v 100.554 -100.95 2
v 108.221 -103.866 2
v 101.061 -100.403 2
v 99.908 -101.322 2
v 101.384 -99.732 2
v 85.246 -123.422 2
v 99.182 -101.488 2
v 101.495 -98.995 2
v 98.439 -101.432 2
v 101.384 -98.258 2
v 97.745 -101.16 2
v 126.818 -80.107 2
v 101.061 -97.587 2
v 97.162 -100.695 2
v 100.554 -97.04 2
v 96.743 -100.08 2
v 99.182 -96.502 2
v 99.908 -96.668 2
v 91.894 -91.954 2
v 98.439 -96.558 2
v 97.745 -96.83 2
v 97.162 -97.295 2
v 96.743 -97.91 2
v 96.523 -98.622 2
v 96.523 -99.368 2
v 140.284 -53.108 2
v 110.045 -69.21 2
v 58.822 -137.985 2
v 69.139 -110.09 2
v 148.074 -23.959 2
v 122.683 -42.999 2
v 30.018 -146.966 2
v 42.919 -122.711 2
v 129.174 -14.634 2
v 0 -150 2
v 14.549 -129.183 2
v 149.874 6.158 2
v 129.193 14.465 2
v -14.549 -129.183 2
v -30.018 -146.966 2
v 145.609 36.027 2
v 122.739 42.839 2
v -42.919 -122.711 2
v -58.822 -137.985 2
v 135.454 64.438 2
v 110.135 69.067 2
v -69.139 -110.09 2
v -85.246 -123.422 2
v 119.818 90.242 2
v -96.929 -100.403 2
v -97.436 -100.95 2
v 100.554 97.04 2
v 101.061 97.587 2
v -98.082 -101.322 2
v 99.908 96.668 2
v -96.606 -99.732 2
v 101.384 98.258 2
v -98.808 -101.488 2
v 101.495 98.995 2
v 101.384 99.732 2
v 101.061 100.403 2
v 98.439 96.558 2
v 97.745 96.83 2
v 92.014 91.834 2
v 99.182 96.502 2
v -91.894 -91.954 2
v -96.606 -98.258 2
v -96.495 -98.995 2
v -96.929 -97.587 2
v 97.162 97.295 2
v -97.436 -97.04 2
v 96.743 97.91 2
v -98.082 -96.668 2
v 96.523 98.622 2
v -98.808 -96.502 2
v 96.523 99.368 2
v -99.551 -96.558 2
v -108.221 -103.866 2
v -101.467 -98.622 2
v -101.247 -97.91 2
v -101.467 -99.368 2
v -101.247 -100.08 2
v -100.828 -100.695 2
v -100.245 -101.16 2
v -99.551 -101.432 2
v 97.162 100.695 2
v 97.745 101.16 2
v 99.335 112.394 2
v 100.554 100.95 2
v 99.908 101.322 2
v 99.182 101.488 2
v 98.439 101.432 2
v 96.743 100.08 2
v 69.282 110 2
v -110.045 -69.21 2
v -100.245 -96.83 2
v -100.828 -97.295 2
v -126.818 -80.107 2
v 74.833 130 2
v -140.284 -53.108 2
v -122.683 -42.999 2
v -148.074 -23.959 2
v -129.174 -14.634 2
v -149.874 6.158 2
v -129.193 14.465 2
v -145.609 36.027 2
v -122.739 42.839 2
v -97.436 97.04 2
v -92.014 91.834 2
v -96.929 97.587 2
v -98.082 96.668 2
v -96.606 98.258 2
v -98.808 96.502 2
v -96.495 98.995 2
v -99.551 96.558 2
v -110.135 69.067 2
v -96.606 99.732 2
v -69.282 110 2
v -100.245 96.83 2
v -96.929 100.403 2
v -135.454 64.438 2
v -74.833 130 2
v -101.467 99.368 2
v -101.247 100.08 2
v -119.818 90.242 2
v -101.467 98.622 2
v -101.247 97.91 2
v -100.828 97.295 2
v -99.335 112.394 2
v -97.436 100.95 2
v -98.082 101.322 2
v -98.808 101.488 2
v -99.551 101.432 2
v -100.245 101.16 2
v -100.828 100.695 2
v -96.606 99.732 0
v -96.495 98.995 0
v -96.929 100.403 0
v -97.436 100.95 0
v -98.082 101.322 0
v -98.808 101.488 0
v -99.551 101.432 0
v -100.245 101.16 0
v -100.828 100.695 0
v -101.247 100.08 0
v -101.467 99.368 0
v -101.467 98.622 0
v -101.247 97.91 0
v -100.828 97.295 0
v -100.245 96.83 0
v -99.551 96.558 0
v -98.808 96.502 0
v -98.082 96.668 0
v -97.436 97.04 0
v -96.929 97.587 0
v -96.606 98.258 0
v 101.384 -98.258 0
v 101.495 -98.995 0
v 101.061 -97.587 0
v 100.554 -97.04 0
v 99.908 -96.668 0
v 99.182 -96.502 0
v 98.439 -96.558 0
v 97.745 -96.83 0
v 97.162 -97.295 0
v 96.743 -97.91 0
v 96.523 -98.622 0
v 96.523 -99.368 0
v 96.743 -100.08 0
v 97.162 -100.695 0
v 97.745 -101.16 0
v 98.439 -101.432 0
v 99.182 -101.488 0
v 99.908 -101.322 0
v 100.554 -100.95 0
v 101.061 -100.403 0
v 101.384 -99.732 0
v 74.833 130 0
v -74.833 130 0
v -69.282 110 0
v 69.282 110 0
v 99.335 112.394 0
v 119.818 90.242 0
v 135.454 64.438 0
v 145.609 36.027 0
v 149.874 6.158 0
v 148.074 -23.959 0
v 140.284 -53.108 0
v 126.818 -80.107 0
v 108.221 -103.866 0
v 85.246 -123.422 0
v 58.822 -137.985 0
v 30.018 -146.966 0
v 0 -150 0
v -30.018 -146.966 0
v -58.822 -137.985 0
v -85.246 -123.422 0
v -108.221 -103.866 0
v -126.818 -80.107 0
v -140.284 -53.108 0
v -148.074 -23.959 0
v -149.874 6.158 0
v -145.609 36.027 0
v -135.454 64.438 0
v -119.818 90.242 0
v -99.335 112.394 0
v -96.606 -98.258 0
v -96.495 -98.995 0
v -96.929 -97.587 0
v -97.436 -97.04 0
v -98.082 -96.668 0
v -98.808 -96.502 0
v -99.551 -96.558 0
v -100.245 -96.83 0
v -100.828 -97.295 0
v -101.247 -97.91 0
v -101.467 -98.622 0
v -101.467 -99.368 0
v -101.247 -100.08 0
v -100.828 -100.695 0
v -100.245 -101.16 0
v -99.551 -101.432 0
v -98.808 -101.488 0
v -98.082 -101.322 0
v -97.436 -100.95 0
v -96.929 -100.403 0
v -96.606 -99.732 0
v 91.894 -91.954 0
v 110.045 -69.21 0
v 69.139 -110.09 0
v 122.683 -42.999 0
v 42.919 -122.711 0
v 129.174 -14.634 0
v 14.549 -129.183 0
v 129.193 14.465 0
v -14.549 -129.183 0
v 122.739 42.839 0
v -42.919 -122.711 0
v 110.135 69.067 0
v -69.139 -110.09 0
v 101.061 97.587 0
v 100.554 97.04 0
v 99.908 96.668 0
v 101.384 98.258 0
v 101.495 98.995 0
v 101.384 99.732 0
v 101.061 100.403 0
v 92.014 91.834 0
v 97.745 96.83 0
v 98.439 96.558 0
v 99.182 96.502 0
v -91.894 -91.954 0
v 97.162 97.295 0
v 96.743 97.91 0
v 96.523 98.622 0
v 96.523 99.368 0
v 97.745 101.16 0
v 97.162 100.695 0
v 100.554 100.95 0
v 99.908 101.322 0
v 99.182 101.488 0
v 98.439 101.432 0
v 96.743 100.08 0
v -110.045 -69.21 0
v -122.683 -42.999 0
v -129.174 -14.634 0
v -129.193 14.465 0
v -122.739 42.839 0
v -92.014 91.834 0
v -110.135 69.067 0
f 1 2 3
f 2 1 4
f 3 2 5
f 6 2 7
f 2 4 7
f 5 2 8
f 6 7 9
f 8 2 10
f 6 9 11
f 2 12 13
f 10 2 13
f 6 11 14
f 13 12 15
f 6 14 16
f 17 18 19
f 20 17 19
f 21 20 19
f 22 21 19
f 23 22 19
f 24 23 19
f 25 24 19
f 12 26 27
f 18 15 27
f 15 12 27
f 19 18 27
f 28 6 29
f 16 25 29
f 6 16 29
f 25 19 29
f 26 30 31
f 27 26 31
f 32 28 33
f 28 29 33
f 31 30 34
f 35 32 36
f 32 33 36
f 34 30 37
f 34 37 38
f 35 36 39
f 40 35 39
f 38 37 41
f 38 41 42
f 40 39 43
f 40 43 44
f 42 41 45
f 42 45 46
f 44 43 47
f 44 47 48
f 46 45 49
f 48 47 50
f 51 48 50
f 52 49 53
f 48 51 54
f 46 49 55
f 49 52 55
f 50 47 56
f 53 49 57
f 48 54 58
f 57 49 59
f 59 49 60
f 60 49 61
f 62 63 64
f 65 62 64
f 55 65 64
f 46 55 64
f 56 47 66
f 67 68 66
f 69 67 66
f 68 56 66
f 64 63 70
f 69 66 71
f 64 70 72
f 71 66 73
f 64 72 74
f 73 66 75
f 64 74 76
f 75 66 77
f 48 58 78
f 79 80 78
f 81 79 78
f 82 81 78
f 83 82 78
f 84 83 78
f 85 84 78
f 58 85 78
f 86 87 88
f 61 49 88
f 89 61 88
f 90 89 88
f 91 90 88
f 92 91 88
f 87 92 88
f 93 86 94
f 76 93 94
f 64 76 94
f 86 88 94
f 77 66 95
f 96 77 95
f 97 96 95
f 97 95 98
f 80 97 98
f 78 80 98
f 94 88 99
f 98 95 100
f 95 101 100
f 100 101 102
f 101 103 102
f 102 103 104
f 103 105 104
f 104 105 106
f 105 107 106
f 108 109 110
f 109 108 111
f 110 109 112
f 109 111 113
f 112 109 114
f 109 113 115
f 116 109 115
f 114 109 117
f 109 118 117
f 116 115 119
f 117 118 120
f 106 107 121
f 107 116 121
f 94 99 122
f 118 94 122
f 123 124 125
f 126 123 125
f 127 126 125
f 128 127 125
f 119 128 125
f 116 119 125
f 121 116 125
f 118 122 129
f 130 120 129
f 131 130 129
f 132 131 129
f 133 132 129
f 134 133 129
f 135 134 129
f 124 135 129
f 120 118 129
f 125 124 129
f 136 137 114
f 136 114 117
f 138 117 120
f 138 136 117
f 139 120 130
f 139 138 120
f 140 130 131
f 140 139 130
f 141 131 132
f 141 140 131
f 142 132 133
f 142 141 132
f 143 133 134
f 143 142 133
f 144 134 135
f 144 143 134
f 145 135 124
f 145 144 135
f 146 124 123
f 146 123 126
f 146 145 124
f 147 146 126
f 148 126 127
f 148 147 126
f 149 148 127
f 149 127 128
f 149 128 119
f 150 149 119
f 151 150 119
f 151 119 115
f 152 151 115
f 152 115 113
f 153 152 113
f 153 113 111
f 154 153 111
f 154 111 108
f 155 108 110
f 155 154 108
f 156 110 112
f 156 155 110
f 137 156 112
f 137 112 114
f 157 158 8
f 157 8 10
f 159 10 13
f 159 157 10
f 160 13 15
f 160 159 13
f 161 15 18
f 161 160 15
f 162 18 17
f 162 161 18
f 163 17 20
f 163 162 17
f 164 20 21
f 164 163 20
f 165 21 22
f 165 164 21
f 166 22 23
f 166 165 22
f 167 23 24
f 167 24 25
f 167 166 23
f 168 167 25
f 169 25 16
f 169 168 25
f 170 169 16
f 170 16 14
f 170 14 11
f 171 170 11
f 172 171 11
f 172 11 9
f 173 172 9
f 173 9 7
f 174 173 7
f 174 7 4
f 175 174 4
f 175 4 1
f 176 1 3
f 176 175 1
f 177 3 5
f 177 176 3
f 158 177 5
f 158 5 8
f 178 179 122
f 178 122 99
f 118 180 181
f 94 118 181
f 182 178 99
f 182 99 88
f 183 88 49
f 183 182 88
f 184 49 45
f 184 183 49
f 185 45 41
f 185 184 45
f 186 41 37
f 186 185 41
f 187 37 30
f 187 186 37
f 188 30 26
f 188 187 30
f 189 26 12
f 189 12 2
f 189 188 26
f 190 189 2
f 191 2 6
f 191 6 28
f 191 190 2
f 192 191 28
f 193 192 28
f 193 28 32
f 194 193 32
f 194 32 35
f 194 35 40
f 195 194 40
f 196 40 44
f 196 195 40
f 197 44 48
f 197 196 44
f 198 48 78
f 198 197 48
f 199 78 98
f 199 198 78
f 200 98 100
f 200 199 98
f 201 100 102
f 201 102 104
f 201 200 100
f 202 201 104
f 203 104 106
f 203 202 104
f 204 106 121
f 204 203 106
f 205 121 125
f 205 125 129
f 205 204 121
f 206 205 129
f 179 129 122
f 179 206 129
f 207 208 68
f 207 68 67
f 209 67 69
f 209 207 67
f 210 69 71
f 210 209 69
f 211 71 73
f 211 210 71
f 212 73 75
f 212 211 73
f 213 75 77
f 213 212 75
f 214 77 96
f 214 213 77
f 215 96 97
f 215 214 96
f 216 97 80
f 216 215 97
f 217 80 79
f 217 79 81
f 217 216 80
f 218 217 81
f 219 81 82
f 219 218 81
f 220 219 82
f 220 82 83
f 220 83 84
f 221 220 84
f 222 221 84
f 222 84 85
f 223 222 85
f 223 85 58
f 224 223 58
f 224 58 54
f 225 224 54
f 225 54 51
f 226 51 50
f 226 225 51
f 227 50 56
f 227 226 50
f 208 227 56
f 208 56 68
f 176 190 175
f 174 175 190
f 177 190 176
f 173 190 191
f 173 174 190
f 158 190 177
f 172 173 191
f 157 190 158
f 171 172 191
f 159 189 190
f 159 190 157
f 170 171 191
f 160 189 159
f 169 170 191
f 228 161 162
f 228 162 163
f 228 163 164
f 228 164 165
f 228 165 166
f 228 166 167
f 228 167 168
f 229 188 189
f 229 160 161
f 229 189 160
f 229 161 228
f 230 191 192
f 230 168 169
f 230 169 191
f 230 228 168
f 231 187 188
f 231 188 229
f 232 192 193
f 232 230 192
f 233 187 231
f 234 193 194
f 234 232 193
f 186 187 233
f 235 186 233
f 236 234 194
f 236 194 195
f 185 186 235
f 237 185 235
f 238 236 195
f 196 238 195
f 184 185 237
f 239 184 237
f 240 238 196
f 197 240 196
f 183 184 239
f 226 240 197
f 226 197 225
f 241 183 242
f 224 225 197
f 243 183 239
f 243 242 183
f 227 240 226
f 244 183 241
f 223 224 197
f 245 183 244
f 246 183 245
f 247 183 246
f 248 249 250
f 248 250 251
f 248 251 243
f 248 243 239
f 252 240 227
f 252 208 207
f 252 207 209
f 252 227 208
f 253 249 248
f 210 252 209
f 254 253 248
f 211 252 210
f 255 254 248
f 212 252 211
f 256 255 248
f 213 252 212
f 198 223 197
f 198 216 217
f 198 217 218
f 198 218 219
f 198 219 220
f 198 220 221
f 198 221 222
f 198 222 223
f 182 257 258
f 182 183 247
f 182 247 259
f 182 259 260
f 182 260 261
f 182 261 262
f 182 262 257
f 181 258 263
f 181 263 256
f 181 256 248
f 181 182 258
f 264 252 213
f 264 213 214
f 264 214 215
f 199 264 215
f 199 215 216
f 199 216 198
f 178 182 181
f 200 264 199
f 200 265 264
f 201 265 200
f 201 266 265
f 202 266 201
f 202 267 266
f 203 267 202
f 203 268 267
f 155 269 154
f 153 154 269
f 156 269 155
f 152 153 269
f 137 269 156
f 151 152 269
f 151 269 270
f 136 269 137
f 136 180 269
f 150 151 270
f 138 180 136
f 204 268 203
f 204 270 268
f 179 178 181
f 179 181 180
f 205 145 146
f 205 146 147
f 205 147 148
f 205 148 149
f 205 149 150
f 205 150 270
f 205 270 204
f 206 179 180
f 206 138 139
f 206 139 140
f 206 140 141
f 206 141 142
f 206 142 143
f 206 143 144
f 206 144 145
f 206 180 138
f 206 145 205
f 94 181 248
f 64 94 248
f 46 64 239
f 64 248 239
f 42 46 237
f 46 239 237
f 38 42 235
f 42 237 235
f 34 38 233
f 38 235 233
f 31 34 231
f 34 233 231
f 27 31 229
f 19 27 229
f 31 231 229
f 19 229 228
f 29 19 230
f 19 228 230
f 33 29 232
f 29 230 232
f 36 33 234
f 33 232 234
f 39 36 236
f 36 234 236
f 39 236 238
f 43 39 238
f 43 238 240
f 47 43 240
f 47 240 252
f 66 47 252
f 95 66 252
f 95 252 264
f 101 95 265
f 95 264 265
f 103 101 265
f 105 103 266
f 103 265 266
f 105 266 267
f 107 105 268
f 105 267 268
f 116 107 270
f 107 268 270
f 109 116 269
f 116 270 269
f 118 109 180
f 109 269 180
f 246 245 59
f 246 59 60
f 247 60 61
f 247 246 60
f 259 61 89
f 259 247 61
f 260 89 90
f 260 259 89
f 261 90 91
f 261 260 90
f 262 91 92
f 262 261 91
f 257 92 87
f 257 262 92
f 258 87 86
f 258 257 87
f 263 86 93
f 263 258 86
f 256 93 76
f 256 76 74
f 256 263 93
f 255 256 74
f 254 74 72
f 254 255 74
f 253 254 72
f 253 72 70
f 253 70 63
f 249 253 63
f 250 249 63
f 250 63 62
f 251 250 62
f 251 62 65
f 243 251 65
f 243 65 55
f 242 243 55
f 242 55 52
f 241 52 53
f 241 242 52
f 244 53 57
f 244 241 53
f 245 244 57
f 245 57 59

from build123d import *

# Parameters (mm, degrees)
ESQUISSE1_R        = 2.5
BOSS_EXTRU_1_DEPTH = 2


with BuildPart() as part:
    # Esquisse1 → Boss.-Extru.1 (new body)
    with BuildSketch(Plane.XY):
        with BuildLine():
            Line((-74.833147735, 130), (74.833147735, 130))
            ThreePointArc((74.833147735, 130), (0, -150), (-74.833147735, 130))
        make_face()
        with Locations((-98.994949366, 98.994949366)):
            Circle(ESQUISSE1_R, mode=Mode.SUBTRACT)
        with Locations((-98.994949366, -98.994949366)):
            Circle(ESQUISSE1_R, mode=Mode.SUBTRACT)
        with Locations((98.994949366, -98.994949366)):
            Circle(ESQUISSE1_R, mode=Mode.SUBTRACT)
        with Locations((98.994949366, 98.994949366)):
            Circle(ESQUISSE1_R, mode=Mode.SUBTRACT)
        with BuildLine():
            Line((-69.282032303, 110), (69.282032303, 110))
            ThreePointArc((69.282032303, 110), (0, -130), (-69.282032303, 110))
        make_face(mode=Mode.SUBTRACT)
    extrude(amount=BOSS_EXTRU_1_DEPTH)


solid = part.part
